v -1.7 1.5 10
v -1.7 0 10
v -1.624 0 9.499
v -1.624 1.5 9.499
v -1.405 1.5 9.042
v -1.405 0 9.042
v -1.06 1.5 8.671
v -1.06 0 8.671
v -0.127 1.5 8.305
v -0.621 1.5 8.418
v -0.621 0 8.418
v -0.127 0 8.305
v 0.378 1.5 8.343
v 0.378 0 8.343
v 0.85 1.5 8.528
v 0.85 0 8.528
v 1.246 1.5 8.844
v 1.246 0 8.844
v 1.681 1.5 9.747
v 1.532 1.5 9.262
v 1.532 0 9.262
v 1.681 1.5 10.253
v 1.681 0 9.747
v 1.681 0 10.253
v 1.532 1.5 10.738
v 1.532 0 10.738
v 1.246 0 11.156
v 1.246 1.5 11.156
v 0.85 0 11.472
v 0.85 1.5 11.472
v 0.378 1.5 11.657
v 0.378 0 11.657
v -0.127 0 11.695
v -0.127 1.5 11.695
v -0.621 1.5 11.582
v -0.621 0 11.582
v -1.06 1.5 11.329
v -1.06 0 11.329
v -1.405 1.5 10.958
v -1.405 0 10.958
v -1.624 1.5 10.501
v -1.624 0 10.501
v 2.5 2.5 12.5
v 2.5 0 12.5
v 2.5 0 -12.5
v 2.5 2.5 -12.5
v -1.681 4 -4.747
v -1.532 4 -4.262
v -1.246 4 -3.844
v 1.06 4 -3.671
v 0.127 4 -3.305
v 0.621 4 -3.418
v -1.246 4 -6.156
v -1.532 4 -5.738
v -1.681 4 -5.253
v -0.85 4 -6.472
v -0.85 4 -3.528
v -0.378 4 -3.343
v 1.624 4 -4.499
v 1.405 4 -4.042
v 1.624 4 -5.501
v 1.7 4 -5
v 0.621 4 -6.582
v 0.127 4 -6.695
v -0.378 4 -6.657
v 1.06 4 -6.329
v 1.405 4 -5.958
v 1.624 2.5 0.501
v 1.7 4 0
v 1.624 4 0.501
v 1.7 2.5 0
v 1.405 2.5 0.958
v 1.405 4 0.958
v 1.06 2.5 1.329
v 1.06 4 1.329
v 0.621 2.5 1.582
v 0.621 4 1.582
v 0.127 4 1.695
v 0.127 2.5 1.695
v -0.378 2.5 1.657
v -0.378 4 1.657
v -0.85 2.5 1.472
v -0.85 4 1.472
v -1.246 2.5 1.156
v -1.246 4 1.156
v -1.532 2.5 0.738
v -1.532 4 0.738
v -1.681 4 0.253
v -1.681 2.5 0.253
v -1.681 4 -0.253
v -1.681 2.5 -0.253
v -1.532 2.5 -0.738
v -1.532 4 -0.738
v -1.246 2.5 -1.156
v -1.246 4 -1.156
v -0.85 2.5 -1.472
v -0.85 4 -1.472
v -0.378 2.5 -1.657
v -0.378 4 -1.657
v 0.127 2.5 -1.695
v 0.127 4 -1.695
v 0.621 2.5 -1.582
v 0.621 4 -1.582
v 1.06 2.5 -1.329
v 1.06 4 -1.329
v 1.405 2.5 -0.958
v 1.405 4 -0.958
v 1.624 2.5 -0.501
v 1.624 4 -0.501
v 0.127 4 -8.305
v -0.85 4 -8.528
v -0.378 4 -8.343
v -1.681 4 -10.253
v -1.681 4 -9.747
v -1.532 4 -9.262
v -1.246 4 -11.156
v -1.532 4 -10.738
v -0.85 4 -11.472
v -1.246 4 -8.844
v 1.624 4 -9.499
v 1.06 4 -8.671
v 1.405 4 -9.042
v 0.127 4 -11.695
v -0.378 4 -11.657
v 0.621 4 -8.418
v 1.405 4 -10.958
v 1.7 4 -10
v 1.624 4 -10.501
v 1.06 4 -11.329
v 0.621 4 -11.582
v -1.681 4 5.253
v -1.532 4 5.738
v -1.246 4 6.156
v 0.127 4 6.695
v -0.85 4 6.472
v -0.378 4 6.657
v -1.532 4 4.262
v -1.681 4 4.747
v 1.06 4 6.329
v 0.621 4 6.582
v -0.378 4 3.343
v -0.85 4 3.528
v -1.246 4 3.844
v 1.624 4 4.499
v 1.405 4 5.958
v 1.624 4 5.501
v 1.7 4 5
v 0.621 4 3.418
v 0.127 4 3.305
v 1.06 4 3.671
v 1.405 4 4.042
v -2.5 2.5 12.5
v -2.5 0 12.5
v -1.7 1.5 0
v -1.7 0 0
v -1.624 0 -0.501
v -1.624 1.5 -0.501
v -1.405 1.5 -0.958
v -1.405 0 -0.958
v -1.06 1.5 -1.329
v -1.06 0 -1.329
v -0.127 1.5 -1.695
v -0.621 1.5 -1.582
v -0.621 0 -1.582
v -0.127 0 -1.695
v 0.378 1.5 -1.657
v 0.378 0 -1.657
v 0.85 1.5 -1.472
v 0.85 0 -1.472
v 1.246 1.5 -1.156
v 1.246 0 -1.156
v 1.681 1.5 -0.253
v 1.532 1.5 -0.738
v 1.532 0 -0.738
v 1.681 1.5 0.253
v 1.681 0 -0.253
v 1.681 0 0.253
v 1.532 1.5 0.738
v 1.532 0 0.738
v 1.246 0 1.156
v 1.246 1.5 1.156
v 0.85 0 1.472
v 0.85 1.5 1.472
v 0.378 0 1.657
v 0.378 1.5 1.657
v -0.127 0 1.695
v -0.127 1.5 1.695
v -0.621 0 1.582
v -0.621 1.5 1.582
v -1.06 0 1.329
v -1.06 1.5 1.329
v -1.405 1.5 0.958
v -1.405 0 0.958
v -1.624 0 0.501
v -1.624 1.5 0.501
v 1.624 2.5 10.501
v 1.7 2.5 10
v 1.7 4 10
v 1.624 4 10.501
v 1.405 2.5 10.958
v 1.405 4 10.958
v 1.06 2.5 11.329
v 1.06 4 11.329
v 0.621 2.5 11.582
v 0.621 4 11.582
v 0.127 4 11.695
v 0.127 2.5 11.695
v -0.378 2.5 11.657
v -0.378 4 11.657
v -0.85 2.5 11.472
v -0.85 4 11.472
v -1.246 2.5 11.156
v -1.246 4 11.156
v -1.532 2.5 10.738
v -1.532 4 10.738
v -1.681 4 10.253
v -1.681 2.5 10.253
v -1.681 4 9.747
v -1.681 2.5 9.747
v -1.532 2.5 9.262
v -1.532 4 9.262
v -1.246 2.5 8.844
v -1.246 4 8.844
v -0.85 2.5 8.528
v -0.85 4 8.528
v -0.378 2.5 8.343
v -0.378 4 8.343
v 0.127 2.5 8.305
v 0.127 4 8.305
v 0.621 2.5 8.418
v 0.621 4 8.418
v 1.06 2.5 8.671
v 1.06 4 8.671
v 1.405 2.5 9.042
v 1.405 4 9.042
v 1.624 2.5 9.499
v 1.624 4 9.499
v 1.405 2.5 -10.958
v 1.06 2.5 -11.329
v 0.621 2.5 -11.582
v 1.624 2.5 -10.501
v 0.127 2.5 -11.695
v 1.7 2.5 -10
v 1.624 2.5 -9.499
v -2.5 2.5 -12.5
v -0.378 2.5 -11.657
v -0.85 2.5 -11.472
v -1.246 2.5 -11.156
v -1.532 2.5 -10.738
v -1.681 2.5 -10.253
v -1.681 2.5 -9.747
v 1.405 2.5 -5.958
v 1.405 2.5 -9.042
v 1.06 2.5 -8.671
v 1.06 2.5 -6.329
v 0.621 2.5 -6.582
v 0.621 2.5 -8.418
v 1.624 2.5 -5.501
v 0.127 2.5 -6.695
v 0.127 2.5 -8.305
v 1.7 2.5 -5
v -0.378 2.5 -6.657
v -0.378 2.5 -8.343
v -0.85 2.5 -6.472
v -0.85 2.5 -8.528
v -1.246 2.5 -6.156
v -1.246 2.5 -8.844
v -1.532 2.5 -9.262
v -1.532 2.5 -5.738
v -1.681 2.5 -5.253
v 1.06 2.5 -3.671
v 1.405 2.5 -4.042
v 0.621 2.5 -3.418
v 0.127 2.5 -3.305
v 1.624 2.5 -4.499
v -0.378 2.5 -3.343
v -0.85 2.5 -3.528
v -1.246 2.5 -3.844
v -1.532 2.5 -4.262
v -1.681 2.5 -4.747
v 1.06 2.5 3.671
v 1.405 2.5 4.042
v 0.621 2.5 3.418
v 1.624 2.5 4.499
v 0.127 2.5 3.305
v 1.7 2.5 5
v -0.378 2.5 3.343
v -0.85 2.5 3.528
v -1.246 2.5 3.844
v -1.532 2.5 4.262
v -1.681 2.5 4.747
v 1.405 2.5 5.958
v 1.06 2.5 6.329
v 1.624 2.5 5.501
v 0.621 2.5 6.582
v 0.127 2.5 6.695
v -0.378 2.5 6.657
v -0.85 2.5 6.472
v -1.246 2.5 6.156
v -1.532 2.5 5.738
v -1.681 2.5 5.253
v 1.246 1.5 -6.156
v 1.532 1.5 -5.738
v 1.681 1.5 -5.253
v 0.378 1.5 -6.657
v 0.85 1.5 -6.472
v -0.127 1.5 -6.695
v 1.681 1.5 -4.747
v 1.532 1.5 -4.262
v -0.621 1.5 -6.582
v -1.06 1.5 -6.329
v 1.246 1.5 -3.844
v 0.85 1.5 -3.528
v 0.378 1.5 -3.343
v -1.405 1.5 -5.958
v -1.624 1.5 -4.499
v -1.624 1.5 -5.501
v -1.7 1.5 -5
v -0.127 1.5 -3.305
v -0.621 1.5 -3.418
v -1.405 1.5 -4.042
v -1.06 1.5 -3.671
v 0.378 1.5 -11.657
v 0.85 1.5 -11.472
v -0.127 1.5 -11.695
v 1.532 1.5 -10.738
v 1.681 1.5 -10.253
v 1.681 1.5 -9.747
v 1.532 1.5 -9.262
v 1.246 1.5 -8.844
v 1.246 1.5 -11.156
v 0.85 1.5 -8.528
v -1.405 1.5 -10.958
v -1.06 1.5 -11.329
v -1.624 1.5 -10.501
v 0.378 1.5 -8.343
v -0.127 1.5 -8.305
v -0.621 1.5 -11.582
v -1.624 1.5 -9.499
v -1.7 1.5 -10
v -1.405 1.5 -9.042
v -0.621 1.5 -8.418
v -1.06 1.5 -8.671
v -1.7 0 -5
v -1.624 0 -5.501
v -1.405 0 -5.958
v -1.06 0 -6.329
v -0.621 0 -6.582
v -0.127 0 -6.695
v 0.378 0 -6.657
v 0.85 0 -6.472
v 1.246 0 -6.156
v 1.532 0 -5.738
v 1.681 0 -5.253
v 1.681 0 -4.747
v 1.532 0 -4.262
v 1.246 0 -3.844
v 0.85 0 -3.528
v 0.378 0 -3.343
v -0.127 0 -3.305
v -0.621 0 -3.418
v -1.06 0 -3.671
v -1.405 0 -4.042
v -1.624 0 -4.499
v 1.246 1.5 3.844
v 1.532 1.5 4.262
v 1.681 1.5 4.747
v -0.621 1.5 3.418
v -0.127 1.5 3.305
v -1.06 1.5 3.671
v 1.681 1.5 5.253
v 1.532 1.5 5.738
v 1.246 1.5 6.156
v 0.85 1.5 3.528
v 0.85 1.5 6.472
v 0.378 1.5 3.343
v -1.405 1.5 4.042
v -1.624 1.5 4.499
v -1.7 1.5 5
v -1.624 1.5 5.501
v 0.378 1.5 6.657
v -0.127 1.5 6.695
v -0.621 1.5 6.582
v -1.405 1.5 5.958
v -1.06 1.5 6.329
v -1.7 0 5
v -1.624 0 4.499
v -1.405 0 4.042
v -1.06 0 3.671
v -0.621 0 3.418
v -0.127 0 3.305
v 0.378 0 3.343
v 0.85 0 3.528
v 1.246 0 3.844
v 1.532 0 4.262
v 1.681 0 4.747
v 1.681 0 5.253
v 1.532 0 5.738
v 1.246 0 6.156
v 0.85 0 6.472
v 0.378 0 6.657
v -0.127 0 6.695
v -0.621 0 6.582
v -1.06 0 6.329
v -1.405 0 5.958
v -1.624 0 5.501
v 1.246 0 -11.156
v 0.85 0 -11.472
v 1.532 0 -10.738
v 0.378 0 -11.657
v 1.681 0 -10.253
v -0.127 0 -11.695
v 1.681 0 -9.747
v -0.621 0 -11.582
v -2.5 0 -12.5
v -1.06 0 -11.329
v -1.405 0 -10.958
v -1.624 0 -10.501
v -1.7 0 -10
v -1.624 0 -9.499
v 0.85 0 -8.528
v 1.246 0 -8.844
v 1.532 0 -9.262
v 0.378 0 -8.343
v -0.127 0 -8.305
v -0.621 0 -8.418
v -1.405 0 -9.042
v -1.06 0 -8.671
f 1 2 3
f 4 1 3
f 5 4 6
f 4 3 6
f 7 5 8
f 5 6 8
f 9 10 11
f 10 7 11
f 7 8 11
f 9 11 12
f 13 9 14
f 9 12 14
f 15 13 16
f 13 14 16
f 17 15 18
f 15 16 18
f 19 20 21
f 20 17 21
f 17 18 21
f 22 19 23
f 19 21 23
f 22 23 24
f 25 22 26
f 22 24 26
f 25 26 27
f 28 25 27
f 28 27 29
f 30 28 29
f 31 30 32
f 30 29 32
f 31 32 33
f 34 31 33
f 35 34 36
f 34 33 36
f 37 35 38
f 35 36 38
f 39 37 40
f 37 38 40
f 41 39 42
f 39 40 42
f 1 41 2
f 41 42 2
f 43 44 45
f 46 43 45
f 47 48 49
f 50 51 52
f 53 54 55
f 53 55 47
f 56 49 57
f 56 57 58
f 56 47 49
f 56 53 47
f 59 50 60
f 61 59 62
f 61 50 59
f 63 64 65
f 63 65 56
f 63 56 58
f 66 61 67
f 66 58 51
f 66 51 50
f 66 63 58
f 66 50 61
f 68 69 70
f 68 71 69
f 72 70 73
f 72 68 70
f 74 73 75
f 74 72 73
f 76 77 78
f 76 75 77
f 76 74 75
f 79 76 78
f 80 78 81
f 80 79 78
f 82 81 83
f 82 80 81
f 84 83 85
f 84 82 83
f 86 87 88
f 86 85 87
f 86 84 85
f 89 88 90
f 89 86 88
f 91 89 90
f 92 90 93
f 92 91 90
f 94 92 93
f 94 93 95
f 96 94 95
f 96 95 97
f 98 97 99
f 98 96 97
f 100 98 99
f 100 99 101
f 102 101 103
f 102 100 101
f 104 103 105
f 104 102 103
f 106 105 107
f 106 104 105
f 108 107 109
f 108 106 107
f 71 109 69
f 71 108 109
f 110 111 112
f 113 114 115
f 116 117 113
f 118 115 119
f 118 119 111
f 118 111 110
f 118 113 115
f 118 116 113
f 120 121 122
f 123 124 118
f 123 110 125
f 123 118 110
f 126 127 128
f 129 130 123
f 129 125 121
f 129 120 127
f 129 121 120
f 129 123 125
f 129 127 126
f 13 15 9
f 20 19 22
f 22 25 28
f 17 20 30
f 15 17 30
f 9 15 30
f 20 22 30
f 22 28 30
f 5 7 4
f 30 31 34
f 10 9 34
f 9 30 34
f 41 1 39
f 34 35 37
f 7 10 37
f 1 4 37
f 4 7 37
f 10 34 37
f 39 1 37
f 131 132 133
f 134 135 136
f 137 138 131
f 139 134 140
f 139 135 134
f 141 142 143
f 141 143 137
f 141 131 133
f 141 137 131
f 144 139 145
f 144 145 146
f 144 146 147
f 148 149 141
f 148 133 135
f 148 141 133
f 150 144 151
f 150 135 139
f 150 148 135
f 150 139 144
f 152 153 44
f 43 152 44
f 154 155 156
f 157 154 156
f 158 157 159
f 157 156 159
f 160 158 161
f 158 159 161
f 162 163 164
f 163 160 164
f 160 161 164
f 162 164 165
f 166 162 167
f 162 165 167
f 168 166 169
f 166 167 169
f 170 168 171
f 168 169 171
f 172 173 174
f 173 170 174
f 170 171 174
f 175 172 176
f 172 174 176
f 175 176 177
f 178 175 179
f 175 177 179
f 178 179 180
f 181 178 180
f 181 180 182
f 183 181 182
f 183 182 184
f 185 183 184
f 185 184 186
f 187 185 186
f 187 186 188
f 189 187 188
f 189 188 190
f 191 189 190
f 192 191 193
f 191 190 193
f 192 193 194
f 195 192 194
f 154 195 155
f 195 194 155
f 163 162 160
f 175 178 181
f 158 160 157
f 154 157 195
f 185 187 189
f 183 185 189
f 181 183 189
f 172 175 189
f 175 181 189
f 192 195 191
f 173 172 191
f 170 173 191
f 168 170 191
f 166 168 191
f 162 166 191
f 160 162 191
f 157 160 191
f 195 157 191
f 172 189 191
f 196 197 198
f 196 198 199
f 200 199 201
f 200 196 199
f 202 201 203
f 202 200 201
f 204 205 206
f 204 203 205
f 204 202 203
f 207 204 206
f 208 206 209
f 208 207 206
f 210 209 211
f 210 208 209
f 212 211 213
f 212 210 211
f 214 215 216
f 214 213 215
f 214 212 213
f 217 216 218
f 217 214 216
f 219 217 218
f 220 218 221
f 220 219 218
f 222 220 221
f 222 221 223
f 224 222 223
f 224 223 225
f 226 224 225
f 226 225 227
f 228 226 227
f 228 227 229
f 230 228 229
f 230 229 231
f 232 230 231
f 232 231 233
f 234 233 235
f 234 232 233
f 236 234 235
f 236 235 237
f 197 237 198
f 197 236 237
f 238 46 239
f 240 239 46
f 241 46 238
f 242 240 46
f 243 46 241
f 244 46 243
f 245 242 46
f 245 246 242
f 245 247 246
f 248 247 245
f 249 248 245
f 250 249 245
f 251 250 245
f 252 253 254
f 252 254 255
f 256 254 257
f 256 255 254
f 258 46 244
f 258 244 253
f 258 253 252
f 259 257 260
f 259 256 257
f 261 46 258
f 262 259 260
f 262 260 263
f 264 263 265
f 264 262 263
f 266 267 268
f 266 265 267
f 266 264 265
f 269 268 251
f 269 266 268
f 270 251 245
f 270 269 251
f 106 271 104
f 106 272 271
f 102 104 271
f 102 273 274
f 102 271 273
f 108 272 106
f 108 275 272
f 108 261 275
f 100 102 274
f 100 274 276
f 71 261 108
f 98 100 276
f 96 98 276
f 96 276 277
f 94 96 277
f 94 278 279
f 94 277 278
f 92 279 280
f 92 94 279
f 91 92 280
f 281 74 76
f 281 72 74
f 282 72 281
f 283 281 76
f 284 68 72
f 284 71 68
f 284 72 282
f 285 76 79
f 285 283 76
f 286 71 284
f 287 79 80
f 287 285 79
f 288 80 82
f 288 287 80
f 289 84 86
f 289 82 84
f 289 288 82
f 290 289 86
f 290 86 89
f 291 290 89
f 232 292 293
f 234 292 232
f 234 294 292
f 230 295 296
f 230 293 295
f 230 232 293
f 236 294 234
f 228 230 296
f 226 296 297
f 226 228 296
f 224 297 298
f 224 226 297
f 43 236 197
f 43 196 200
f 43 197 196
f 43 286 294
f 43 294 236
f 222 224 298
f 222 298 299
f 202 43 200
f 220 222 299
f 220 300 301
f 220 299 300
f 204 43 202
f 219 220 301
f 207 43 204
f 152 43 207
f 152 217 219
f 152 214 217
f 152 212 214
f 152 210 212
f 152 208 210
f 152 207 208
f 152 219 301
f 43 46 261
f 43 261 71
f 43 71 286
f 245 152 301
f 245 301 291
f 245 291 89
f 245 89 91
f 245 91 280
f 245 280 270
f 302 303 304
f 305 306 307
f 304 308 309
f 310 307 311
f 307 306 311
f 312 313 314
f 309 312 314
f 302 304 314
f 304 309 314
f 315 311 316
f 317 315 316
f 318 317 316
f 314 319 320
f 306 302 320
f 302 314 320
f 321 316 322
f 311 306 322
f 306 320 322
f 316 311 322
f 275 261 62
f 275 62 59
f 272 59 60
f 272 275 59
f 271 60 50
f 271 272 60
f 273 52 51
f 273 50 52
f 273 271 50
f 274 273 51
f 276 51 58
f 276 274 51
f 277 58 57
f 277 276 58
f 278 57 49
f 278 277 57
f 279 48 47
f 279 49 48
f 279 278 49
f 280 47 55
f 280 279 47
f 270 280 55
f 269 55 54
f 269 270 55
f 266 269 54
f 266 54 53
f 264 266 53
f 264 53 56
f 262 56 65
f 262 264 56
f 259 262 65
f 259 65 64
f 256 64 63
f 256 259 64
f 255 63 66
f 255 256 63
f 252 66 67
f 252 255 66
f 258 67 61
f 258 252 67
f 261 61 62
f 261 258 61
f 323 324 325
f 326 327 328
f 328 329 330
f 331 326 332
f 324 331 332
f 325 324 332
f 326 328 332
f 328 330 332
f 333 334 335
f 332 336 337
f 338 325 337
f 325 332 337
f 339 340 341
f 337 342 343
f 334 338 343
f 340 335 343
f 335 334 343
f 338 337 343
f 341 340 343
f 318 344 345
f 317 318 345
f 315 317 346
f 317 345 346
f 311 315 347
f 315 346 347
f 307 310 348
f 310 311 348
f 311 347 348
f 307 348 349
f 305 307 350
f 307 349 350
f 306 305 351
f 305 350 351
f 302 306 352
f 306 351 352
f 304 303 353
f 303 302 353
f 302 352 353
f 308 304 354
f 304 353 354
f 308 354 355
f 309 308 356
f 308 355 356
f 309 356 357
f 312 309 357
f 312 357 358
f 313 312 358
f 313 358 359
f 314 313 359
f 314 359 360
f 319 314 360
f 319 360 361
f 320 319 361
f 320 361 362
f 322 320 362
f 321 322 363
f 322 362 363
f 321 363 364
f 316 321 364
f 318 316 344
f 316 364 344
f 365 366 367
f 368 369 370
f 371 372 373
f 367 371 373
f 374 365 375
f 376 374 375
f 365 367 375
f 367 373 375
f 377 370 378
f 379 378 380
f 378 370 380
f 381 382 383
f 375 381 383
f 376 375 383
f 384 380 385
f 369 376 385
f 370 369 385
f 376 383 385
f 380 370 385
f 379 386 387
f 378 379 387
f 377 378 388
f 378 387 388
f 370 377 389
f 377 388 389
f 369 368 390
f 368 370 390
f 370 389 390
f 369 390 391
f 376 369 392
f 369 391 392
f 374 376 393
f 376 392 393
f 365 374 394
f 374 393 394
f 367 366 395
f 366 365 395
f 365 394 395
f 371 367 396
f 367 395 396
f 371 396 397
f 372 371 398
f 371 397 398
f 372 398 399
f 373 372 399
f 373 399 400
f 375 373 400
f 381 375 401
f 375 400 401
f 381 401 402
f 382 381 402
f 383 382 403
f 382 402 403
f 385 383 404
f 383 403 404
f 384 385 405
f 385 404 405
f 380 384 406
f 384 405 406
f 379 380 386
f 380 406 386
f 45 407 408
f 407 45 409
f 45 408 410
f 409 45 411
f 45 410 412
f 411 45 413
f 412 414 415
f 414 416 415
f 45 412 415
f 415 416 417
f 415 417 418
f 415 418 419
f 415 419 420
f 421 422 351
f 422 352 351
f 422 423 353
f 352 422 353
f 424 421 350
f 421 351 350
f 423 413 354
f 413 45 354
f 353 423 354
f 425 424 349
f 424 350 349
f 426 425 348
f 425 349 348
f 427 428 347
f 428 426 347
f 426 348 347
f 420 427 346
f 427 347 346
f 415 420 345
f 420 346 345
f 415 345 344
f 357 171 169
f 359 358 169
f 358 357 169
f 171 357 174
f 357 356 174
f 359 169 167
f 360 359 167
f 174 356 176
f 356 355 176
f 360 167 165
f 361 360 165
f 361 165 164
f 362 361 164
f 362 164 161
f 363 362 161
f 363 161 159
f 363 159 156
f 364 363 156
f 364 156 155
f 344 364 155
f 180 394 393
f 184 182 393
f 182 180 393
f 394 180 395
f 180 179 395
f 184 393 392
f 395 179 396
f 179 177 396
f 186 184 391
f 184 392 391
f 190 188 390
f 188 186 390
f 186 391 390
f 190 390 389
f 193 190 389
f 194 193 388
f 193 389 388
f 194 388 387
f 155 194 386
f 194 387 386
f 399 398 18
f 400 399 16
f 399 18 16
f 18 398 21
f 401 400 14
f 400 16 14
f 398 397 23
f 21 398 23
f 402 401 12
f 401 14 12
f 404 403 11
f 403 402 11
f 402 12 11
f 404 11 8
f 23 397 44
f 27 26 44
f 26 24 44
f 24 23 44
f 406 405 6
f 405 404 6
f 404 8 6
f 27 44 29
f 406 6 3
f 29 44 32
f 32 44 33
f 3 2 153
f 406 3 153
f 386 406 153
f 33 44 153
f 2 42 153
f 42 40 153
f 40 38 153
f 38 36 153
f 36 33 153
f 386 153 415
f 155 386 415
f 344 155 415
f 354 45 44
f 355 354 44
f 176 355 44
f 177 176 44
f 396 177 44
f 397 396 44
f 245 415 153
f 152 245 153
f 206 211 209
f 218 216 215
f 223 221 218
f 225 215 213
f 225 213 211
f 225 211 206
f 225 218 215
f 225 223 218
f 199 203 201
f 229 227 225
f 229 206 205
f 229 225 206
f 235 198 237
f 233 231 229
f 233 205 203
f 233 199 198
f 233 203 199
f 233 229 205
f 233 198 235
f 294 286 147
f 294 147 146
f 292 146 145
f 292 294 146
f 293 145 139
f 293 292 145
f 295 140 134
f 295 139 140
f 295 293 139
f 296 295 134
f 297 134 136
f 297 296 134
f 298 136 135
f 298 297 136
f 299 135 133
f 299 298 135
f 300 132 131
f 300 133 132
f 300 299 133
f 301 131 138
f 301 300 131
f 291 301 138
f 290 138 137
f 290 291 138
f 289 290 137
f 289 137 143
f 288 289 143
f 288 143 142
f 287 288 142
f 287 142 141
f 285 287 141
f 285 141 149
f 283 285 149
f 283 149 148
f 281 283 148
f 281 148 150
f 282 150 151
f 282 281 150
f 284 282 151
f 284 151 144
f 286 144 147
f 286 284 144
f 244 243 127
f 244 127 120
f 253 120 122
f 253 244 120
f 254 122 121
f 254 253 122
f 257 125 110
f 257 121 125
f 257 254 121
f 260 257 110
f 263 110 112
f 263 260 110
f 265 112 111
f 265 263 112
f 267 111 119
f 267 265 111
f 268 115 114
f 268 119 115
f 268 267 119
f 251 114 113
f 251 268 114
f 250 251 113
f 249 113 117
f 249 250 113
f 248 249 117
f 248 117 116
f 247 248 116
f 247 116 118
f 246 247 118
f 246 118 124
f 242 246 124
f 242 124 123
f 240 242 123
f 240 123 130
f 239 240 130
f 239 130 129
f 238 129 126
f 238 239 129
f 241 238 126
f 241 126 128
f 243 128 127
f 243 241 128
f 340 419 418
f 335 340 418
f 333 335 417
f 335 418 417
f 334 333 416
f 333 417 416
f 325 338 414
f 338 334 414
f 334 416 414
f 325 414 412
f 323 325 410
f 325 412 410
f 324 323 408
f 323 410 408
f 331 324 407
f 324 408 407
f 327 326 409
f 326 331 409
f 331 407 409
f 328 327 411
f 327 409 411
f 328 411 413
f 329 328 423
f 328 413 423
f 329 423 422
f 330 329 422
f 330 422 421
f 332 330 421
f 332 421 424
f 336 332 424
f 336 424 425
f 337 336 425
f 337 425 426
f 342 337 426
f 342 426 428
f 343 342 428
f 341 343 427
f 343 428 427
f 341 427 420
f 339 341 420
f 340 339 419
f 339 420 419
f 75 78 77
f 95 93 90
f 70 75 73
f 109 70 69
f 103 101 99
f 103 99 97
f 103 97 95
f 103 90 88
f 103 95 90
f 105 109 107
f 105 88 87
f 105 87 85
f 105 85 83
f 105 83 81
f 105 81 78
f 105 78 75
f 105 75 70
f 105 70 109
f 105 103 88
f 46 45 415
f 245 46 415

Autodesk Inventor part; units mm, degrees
ref_plane "YZ Plane" through (0, 0, 0) normal (1, 0, 0) x (0, 1, 0)
ref_plane "XZ Plane" through (0, 0, 0) normal (0, 1, 0) x (-1, 0, 0)
ref_plane "XY Plane" through (0, 0, 0) normal (0, 0, 1) x (1, 0, 0)
sketch "草圖1" plane through (0, 0, 0) normal (0, 1, 0) x (-1, 0, 0)
  line L0 (2.5, 12.5) -> (-2.5, 12.5)
  line L1 (-2.5, 12.5) -> (-2.5, -12.5)
  line L2 (-2.5, -12.5) -> (2.5, -12.5)
  line L3 (2.5, -12.5) -> (2.5, 12.5)
  circle A0 centre (0, 10) radius 1.7
  circle A1 centre (0, 5) radius 1.7
  circle A2 centre (0, 0) radius 1.7
  circle A3 centre (0, -5) radius 1.7
  circle A4 centre (0, -10) radius 1.7
  point P0 (0, 0)
  point P1 (2.5, 0)
  point P2 (0, -12.5)
  dimension "d0" = 5
  dimension "d1" = 25
  dimension "d2" = 3.4
  dimension "d3" = 2.5
  dimension "d4" = 2.5
  dimension "d7" = 5
extrude "擠出1" add sketch "草圖1" along normal blind 2.5 contours L3 L2 L1 L0 | A0 | A1 | A2 | A3 | A4
extrude "擠出2" cut sketch "草圖1" along normal blind 1.5 contours A0 | A1 | A2 | A3 | A4
sketch "草圖2" plane through (0, 2.5, 0) normal (0, 1, 0) x (1, 0, 0)
  circle A0 centre (0, -10) radius 1.7 projected
  circle A1 centre (0, -5) radius 1.7 projected
  circle A2 centre (0, 0) radius 1.7 projected
  circle A3 centre (0, 5) radius 1.7 projected
  circle A4 centre (0, 10) radius 1.7 projected
  point P0 (0, 0)
extrude "擠出3" add sketch "草圖2" along normal blind 1.5
properties part number "110033226_ipt_16_圍牆"
